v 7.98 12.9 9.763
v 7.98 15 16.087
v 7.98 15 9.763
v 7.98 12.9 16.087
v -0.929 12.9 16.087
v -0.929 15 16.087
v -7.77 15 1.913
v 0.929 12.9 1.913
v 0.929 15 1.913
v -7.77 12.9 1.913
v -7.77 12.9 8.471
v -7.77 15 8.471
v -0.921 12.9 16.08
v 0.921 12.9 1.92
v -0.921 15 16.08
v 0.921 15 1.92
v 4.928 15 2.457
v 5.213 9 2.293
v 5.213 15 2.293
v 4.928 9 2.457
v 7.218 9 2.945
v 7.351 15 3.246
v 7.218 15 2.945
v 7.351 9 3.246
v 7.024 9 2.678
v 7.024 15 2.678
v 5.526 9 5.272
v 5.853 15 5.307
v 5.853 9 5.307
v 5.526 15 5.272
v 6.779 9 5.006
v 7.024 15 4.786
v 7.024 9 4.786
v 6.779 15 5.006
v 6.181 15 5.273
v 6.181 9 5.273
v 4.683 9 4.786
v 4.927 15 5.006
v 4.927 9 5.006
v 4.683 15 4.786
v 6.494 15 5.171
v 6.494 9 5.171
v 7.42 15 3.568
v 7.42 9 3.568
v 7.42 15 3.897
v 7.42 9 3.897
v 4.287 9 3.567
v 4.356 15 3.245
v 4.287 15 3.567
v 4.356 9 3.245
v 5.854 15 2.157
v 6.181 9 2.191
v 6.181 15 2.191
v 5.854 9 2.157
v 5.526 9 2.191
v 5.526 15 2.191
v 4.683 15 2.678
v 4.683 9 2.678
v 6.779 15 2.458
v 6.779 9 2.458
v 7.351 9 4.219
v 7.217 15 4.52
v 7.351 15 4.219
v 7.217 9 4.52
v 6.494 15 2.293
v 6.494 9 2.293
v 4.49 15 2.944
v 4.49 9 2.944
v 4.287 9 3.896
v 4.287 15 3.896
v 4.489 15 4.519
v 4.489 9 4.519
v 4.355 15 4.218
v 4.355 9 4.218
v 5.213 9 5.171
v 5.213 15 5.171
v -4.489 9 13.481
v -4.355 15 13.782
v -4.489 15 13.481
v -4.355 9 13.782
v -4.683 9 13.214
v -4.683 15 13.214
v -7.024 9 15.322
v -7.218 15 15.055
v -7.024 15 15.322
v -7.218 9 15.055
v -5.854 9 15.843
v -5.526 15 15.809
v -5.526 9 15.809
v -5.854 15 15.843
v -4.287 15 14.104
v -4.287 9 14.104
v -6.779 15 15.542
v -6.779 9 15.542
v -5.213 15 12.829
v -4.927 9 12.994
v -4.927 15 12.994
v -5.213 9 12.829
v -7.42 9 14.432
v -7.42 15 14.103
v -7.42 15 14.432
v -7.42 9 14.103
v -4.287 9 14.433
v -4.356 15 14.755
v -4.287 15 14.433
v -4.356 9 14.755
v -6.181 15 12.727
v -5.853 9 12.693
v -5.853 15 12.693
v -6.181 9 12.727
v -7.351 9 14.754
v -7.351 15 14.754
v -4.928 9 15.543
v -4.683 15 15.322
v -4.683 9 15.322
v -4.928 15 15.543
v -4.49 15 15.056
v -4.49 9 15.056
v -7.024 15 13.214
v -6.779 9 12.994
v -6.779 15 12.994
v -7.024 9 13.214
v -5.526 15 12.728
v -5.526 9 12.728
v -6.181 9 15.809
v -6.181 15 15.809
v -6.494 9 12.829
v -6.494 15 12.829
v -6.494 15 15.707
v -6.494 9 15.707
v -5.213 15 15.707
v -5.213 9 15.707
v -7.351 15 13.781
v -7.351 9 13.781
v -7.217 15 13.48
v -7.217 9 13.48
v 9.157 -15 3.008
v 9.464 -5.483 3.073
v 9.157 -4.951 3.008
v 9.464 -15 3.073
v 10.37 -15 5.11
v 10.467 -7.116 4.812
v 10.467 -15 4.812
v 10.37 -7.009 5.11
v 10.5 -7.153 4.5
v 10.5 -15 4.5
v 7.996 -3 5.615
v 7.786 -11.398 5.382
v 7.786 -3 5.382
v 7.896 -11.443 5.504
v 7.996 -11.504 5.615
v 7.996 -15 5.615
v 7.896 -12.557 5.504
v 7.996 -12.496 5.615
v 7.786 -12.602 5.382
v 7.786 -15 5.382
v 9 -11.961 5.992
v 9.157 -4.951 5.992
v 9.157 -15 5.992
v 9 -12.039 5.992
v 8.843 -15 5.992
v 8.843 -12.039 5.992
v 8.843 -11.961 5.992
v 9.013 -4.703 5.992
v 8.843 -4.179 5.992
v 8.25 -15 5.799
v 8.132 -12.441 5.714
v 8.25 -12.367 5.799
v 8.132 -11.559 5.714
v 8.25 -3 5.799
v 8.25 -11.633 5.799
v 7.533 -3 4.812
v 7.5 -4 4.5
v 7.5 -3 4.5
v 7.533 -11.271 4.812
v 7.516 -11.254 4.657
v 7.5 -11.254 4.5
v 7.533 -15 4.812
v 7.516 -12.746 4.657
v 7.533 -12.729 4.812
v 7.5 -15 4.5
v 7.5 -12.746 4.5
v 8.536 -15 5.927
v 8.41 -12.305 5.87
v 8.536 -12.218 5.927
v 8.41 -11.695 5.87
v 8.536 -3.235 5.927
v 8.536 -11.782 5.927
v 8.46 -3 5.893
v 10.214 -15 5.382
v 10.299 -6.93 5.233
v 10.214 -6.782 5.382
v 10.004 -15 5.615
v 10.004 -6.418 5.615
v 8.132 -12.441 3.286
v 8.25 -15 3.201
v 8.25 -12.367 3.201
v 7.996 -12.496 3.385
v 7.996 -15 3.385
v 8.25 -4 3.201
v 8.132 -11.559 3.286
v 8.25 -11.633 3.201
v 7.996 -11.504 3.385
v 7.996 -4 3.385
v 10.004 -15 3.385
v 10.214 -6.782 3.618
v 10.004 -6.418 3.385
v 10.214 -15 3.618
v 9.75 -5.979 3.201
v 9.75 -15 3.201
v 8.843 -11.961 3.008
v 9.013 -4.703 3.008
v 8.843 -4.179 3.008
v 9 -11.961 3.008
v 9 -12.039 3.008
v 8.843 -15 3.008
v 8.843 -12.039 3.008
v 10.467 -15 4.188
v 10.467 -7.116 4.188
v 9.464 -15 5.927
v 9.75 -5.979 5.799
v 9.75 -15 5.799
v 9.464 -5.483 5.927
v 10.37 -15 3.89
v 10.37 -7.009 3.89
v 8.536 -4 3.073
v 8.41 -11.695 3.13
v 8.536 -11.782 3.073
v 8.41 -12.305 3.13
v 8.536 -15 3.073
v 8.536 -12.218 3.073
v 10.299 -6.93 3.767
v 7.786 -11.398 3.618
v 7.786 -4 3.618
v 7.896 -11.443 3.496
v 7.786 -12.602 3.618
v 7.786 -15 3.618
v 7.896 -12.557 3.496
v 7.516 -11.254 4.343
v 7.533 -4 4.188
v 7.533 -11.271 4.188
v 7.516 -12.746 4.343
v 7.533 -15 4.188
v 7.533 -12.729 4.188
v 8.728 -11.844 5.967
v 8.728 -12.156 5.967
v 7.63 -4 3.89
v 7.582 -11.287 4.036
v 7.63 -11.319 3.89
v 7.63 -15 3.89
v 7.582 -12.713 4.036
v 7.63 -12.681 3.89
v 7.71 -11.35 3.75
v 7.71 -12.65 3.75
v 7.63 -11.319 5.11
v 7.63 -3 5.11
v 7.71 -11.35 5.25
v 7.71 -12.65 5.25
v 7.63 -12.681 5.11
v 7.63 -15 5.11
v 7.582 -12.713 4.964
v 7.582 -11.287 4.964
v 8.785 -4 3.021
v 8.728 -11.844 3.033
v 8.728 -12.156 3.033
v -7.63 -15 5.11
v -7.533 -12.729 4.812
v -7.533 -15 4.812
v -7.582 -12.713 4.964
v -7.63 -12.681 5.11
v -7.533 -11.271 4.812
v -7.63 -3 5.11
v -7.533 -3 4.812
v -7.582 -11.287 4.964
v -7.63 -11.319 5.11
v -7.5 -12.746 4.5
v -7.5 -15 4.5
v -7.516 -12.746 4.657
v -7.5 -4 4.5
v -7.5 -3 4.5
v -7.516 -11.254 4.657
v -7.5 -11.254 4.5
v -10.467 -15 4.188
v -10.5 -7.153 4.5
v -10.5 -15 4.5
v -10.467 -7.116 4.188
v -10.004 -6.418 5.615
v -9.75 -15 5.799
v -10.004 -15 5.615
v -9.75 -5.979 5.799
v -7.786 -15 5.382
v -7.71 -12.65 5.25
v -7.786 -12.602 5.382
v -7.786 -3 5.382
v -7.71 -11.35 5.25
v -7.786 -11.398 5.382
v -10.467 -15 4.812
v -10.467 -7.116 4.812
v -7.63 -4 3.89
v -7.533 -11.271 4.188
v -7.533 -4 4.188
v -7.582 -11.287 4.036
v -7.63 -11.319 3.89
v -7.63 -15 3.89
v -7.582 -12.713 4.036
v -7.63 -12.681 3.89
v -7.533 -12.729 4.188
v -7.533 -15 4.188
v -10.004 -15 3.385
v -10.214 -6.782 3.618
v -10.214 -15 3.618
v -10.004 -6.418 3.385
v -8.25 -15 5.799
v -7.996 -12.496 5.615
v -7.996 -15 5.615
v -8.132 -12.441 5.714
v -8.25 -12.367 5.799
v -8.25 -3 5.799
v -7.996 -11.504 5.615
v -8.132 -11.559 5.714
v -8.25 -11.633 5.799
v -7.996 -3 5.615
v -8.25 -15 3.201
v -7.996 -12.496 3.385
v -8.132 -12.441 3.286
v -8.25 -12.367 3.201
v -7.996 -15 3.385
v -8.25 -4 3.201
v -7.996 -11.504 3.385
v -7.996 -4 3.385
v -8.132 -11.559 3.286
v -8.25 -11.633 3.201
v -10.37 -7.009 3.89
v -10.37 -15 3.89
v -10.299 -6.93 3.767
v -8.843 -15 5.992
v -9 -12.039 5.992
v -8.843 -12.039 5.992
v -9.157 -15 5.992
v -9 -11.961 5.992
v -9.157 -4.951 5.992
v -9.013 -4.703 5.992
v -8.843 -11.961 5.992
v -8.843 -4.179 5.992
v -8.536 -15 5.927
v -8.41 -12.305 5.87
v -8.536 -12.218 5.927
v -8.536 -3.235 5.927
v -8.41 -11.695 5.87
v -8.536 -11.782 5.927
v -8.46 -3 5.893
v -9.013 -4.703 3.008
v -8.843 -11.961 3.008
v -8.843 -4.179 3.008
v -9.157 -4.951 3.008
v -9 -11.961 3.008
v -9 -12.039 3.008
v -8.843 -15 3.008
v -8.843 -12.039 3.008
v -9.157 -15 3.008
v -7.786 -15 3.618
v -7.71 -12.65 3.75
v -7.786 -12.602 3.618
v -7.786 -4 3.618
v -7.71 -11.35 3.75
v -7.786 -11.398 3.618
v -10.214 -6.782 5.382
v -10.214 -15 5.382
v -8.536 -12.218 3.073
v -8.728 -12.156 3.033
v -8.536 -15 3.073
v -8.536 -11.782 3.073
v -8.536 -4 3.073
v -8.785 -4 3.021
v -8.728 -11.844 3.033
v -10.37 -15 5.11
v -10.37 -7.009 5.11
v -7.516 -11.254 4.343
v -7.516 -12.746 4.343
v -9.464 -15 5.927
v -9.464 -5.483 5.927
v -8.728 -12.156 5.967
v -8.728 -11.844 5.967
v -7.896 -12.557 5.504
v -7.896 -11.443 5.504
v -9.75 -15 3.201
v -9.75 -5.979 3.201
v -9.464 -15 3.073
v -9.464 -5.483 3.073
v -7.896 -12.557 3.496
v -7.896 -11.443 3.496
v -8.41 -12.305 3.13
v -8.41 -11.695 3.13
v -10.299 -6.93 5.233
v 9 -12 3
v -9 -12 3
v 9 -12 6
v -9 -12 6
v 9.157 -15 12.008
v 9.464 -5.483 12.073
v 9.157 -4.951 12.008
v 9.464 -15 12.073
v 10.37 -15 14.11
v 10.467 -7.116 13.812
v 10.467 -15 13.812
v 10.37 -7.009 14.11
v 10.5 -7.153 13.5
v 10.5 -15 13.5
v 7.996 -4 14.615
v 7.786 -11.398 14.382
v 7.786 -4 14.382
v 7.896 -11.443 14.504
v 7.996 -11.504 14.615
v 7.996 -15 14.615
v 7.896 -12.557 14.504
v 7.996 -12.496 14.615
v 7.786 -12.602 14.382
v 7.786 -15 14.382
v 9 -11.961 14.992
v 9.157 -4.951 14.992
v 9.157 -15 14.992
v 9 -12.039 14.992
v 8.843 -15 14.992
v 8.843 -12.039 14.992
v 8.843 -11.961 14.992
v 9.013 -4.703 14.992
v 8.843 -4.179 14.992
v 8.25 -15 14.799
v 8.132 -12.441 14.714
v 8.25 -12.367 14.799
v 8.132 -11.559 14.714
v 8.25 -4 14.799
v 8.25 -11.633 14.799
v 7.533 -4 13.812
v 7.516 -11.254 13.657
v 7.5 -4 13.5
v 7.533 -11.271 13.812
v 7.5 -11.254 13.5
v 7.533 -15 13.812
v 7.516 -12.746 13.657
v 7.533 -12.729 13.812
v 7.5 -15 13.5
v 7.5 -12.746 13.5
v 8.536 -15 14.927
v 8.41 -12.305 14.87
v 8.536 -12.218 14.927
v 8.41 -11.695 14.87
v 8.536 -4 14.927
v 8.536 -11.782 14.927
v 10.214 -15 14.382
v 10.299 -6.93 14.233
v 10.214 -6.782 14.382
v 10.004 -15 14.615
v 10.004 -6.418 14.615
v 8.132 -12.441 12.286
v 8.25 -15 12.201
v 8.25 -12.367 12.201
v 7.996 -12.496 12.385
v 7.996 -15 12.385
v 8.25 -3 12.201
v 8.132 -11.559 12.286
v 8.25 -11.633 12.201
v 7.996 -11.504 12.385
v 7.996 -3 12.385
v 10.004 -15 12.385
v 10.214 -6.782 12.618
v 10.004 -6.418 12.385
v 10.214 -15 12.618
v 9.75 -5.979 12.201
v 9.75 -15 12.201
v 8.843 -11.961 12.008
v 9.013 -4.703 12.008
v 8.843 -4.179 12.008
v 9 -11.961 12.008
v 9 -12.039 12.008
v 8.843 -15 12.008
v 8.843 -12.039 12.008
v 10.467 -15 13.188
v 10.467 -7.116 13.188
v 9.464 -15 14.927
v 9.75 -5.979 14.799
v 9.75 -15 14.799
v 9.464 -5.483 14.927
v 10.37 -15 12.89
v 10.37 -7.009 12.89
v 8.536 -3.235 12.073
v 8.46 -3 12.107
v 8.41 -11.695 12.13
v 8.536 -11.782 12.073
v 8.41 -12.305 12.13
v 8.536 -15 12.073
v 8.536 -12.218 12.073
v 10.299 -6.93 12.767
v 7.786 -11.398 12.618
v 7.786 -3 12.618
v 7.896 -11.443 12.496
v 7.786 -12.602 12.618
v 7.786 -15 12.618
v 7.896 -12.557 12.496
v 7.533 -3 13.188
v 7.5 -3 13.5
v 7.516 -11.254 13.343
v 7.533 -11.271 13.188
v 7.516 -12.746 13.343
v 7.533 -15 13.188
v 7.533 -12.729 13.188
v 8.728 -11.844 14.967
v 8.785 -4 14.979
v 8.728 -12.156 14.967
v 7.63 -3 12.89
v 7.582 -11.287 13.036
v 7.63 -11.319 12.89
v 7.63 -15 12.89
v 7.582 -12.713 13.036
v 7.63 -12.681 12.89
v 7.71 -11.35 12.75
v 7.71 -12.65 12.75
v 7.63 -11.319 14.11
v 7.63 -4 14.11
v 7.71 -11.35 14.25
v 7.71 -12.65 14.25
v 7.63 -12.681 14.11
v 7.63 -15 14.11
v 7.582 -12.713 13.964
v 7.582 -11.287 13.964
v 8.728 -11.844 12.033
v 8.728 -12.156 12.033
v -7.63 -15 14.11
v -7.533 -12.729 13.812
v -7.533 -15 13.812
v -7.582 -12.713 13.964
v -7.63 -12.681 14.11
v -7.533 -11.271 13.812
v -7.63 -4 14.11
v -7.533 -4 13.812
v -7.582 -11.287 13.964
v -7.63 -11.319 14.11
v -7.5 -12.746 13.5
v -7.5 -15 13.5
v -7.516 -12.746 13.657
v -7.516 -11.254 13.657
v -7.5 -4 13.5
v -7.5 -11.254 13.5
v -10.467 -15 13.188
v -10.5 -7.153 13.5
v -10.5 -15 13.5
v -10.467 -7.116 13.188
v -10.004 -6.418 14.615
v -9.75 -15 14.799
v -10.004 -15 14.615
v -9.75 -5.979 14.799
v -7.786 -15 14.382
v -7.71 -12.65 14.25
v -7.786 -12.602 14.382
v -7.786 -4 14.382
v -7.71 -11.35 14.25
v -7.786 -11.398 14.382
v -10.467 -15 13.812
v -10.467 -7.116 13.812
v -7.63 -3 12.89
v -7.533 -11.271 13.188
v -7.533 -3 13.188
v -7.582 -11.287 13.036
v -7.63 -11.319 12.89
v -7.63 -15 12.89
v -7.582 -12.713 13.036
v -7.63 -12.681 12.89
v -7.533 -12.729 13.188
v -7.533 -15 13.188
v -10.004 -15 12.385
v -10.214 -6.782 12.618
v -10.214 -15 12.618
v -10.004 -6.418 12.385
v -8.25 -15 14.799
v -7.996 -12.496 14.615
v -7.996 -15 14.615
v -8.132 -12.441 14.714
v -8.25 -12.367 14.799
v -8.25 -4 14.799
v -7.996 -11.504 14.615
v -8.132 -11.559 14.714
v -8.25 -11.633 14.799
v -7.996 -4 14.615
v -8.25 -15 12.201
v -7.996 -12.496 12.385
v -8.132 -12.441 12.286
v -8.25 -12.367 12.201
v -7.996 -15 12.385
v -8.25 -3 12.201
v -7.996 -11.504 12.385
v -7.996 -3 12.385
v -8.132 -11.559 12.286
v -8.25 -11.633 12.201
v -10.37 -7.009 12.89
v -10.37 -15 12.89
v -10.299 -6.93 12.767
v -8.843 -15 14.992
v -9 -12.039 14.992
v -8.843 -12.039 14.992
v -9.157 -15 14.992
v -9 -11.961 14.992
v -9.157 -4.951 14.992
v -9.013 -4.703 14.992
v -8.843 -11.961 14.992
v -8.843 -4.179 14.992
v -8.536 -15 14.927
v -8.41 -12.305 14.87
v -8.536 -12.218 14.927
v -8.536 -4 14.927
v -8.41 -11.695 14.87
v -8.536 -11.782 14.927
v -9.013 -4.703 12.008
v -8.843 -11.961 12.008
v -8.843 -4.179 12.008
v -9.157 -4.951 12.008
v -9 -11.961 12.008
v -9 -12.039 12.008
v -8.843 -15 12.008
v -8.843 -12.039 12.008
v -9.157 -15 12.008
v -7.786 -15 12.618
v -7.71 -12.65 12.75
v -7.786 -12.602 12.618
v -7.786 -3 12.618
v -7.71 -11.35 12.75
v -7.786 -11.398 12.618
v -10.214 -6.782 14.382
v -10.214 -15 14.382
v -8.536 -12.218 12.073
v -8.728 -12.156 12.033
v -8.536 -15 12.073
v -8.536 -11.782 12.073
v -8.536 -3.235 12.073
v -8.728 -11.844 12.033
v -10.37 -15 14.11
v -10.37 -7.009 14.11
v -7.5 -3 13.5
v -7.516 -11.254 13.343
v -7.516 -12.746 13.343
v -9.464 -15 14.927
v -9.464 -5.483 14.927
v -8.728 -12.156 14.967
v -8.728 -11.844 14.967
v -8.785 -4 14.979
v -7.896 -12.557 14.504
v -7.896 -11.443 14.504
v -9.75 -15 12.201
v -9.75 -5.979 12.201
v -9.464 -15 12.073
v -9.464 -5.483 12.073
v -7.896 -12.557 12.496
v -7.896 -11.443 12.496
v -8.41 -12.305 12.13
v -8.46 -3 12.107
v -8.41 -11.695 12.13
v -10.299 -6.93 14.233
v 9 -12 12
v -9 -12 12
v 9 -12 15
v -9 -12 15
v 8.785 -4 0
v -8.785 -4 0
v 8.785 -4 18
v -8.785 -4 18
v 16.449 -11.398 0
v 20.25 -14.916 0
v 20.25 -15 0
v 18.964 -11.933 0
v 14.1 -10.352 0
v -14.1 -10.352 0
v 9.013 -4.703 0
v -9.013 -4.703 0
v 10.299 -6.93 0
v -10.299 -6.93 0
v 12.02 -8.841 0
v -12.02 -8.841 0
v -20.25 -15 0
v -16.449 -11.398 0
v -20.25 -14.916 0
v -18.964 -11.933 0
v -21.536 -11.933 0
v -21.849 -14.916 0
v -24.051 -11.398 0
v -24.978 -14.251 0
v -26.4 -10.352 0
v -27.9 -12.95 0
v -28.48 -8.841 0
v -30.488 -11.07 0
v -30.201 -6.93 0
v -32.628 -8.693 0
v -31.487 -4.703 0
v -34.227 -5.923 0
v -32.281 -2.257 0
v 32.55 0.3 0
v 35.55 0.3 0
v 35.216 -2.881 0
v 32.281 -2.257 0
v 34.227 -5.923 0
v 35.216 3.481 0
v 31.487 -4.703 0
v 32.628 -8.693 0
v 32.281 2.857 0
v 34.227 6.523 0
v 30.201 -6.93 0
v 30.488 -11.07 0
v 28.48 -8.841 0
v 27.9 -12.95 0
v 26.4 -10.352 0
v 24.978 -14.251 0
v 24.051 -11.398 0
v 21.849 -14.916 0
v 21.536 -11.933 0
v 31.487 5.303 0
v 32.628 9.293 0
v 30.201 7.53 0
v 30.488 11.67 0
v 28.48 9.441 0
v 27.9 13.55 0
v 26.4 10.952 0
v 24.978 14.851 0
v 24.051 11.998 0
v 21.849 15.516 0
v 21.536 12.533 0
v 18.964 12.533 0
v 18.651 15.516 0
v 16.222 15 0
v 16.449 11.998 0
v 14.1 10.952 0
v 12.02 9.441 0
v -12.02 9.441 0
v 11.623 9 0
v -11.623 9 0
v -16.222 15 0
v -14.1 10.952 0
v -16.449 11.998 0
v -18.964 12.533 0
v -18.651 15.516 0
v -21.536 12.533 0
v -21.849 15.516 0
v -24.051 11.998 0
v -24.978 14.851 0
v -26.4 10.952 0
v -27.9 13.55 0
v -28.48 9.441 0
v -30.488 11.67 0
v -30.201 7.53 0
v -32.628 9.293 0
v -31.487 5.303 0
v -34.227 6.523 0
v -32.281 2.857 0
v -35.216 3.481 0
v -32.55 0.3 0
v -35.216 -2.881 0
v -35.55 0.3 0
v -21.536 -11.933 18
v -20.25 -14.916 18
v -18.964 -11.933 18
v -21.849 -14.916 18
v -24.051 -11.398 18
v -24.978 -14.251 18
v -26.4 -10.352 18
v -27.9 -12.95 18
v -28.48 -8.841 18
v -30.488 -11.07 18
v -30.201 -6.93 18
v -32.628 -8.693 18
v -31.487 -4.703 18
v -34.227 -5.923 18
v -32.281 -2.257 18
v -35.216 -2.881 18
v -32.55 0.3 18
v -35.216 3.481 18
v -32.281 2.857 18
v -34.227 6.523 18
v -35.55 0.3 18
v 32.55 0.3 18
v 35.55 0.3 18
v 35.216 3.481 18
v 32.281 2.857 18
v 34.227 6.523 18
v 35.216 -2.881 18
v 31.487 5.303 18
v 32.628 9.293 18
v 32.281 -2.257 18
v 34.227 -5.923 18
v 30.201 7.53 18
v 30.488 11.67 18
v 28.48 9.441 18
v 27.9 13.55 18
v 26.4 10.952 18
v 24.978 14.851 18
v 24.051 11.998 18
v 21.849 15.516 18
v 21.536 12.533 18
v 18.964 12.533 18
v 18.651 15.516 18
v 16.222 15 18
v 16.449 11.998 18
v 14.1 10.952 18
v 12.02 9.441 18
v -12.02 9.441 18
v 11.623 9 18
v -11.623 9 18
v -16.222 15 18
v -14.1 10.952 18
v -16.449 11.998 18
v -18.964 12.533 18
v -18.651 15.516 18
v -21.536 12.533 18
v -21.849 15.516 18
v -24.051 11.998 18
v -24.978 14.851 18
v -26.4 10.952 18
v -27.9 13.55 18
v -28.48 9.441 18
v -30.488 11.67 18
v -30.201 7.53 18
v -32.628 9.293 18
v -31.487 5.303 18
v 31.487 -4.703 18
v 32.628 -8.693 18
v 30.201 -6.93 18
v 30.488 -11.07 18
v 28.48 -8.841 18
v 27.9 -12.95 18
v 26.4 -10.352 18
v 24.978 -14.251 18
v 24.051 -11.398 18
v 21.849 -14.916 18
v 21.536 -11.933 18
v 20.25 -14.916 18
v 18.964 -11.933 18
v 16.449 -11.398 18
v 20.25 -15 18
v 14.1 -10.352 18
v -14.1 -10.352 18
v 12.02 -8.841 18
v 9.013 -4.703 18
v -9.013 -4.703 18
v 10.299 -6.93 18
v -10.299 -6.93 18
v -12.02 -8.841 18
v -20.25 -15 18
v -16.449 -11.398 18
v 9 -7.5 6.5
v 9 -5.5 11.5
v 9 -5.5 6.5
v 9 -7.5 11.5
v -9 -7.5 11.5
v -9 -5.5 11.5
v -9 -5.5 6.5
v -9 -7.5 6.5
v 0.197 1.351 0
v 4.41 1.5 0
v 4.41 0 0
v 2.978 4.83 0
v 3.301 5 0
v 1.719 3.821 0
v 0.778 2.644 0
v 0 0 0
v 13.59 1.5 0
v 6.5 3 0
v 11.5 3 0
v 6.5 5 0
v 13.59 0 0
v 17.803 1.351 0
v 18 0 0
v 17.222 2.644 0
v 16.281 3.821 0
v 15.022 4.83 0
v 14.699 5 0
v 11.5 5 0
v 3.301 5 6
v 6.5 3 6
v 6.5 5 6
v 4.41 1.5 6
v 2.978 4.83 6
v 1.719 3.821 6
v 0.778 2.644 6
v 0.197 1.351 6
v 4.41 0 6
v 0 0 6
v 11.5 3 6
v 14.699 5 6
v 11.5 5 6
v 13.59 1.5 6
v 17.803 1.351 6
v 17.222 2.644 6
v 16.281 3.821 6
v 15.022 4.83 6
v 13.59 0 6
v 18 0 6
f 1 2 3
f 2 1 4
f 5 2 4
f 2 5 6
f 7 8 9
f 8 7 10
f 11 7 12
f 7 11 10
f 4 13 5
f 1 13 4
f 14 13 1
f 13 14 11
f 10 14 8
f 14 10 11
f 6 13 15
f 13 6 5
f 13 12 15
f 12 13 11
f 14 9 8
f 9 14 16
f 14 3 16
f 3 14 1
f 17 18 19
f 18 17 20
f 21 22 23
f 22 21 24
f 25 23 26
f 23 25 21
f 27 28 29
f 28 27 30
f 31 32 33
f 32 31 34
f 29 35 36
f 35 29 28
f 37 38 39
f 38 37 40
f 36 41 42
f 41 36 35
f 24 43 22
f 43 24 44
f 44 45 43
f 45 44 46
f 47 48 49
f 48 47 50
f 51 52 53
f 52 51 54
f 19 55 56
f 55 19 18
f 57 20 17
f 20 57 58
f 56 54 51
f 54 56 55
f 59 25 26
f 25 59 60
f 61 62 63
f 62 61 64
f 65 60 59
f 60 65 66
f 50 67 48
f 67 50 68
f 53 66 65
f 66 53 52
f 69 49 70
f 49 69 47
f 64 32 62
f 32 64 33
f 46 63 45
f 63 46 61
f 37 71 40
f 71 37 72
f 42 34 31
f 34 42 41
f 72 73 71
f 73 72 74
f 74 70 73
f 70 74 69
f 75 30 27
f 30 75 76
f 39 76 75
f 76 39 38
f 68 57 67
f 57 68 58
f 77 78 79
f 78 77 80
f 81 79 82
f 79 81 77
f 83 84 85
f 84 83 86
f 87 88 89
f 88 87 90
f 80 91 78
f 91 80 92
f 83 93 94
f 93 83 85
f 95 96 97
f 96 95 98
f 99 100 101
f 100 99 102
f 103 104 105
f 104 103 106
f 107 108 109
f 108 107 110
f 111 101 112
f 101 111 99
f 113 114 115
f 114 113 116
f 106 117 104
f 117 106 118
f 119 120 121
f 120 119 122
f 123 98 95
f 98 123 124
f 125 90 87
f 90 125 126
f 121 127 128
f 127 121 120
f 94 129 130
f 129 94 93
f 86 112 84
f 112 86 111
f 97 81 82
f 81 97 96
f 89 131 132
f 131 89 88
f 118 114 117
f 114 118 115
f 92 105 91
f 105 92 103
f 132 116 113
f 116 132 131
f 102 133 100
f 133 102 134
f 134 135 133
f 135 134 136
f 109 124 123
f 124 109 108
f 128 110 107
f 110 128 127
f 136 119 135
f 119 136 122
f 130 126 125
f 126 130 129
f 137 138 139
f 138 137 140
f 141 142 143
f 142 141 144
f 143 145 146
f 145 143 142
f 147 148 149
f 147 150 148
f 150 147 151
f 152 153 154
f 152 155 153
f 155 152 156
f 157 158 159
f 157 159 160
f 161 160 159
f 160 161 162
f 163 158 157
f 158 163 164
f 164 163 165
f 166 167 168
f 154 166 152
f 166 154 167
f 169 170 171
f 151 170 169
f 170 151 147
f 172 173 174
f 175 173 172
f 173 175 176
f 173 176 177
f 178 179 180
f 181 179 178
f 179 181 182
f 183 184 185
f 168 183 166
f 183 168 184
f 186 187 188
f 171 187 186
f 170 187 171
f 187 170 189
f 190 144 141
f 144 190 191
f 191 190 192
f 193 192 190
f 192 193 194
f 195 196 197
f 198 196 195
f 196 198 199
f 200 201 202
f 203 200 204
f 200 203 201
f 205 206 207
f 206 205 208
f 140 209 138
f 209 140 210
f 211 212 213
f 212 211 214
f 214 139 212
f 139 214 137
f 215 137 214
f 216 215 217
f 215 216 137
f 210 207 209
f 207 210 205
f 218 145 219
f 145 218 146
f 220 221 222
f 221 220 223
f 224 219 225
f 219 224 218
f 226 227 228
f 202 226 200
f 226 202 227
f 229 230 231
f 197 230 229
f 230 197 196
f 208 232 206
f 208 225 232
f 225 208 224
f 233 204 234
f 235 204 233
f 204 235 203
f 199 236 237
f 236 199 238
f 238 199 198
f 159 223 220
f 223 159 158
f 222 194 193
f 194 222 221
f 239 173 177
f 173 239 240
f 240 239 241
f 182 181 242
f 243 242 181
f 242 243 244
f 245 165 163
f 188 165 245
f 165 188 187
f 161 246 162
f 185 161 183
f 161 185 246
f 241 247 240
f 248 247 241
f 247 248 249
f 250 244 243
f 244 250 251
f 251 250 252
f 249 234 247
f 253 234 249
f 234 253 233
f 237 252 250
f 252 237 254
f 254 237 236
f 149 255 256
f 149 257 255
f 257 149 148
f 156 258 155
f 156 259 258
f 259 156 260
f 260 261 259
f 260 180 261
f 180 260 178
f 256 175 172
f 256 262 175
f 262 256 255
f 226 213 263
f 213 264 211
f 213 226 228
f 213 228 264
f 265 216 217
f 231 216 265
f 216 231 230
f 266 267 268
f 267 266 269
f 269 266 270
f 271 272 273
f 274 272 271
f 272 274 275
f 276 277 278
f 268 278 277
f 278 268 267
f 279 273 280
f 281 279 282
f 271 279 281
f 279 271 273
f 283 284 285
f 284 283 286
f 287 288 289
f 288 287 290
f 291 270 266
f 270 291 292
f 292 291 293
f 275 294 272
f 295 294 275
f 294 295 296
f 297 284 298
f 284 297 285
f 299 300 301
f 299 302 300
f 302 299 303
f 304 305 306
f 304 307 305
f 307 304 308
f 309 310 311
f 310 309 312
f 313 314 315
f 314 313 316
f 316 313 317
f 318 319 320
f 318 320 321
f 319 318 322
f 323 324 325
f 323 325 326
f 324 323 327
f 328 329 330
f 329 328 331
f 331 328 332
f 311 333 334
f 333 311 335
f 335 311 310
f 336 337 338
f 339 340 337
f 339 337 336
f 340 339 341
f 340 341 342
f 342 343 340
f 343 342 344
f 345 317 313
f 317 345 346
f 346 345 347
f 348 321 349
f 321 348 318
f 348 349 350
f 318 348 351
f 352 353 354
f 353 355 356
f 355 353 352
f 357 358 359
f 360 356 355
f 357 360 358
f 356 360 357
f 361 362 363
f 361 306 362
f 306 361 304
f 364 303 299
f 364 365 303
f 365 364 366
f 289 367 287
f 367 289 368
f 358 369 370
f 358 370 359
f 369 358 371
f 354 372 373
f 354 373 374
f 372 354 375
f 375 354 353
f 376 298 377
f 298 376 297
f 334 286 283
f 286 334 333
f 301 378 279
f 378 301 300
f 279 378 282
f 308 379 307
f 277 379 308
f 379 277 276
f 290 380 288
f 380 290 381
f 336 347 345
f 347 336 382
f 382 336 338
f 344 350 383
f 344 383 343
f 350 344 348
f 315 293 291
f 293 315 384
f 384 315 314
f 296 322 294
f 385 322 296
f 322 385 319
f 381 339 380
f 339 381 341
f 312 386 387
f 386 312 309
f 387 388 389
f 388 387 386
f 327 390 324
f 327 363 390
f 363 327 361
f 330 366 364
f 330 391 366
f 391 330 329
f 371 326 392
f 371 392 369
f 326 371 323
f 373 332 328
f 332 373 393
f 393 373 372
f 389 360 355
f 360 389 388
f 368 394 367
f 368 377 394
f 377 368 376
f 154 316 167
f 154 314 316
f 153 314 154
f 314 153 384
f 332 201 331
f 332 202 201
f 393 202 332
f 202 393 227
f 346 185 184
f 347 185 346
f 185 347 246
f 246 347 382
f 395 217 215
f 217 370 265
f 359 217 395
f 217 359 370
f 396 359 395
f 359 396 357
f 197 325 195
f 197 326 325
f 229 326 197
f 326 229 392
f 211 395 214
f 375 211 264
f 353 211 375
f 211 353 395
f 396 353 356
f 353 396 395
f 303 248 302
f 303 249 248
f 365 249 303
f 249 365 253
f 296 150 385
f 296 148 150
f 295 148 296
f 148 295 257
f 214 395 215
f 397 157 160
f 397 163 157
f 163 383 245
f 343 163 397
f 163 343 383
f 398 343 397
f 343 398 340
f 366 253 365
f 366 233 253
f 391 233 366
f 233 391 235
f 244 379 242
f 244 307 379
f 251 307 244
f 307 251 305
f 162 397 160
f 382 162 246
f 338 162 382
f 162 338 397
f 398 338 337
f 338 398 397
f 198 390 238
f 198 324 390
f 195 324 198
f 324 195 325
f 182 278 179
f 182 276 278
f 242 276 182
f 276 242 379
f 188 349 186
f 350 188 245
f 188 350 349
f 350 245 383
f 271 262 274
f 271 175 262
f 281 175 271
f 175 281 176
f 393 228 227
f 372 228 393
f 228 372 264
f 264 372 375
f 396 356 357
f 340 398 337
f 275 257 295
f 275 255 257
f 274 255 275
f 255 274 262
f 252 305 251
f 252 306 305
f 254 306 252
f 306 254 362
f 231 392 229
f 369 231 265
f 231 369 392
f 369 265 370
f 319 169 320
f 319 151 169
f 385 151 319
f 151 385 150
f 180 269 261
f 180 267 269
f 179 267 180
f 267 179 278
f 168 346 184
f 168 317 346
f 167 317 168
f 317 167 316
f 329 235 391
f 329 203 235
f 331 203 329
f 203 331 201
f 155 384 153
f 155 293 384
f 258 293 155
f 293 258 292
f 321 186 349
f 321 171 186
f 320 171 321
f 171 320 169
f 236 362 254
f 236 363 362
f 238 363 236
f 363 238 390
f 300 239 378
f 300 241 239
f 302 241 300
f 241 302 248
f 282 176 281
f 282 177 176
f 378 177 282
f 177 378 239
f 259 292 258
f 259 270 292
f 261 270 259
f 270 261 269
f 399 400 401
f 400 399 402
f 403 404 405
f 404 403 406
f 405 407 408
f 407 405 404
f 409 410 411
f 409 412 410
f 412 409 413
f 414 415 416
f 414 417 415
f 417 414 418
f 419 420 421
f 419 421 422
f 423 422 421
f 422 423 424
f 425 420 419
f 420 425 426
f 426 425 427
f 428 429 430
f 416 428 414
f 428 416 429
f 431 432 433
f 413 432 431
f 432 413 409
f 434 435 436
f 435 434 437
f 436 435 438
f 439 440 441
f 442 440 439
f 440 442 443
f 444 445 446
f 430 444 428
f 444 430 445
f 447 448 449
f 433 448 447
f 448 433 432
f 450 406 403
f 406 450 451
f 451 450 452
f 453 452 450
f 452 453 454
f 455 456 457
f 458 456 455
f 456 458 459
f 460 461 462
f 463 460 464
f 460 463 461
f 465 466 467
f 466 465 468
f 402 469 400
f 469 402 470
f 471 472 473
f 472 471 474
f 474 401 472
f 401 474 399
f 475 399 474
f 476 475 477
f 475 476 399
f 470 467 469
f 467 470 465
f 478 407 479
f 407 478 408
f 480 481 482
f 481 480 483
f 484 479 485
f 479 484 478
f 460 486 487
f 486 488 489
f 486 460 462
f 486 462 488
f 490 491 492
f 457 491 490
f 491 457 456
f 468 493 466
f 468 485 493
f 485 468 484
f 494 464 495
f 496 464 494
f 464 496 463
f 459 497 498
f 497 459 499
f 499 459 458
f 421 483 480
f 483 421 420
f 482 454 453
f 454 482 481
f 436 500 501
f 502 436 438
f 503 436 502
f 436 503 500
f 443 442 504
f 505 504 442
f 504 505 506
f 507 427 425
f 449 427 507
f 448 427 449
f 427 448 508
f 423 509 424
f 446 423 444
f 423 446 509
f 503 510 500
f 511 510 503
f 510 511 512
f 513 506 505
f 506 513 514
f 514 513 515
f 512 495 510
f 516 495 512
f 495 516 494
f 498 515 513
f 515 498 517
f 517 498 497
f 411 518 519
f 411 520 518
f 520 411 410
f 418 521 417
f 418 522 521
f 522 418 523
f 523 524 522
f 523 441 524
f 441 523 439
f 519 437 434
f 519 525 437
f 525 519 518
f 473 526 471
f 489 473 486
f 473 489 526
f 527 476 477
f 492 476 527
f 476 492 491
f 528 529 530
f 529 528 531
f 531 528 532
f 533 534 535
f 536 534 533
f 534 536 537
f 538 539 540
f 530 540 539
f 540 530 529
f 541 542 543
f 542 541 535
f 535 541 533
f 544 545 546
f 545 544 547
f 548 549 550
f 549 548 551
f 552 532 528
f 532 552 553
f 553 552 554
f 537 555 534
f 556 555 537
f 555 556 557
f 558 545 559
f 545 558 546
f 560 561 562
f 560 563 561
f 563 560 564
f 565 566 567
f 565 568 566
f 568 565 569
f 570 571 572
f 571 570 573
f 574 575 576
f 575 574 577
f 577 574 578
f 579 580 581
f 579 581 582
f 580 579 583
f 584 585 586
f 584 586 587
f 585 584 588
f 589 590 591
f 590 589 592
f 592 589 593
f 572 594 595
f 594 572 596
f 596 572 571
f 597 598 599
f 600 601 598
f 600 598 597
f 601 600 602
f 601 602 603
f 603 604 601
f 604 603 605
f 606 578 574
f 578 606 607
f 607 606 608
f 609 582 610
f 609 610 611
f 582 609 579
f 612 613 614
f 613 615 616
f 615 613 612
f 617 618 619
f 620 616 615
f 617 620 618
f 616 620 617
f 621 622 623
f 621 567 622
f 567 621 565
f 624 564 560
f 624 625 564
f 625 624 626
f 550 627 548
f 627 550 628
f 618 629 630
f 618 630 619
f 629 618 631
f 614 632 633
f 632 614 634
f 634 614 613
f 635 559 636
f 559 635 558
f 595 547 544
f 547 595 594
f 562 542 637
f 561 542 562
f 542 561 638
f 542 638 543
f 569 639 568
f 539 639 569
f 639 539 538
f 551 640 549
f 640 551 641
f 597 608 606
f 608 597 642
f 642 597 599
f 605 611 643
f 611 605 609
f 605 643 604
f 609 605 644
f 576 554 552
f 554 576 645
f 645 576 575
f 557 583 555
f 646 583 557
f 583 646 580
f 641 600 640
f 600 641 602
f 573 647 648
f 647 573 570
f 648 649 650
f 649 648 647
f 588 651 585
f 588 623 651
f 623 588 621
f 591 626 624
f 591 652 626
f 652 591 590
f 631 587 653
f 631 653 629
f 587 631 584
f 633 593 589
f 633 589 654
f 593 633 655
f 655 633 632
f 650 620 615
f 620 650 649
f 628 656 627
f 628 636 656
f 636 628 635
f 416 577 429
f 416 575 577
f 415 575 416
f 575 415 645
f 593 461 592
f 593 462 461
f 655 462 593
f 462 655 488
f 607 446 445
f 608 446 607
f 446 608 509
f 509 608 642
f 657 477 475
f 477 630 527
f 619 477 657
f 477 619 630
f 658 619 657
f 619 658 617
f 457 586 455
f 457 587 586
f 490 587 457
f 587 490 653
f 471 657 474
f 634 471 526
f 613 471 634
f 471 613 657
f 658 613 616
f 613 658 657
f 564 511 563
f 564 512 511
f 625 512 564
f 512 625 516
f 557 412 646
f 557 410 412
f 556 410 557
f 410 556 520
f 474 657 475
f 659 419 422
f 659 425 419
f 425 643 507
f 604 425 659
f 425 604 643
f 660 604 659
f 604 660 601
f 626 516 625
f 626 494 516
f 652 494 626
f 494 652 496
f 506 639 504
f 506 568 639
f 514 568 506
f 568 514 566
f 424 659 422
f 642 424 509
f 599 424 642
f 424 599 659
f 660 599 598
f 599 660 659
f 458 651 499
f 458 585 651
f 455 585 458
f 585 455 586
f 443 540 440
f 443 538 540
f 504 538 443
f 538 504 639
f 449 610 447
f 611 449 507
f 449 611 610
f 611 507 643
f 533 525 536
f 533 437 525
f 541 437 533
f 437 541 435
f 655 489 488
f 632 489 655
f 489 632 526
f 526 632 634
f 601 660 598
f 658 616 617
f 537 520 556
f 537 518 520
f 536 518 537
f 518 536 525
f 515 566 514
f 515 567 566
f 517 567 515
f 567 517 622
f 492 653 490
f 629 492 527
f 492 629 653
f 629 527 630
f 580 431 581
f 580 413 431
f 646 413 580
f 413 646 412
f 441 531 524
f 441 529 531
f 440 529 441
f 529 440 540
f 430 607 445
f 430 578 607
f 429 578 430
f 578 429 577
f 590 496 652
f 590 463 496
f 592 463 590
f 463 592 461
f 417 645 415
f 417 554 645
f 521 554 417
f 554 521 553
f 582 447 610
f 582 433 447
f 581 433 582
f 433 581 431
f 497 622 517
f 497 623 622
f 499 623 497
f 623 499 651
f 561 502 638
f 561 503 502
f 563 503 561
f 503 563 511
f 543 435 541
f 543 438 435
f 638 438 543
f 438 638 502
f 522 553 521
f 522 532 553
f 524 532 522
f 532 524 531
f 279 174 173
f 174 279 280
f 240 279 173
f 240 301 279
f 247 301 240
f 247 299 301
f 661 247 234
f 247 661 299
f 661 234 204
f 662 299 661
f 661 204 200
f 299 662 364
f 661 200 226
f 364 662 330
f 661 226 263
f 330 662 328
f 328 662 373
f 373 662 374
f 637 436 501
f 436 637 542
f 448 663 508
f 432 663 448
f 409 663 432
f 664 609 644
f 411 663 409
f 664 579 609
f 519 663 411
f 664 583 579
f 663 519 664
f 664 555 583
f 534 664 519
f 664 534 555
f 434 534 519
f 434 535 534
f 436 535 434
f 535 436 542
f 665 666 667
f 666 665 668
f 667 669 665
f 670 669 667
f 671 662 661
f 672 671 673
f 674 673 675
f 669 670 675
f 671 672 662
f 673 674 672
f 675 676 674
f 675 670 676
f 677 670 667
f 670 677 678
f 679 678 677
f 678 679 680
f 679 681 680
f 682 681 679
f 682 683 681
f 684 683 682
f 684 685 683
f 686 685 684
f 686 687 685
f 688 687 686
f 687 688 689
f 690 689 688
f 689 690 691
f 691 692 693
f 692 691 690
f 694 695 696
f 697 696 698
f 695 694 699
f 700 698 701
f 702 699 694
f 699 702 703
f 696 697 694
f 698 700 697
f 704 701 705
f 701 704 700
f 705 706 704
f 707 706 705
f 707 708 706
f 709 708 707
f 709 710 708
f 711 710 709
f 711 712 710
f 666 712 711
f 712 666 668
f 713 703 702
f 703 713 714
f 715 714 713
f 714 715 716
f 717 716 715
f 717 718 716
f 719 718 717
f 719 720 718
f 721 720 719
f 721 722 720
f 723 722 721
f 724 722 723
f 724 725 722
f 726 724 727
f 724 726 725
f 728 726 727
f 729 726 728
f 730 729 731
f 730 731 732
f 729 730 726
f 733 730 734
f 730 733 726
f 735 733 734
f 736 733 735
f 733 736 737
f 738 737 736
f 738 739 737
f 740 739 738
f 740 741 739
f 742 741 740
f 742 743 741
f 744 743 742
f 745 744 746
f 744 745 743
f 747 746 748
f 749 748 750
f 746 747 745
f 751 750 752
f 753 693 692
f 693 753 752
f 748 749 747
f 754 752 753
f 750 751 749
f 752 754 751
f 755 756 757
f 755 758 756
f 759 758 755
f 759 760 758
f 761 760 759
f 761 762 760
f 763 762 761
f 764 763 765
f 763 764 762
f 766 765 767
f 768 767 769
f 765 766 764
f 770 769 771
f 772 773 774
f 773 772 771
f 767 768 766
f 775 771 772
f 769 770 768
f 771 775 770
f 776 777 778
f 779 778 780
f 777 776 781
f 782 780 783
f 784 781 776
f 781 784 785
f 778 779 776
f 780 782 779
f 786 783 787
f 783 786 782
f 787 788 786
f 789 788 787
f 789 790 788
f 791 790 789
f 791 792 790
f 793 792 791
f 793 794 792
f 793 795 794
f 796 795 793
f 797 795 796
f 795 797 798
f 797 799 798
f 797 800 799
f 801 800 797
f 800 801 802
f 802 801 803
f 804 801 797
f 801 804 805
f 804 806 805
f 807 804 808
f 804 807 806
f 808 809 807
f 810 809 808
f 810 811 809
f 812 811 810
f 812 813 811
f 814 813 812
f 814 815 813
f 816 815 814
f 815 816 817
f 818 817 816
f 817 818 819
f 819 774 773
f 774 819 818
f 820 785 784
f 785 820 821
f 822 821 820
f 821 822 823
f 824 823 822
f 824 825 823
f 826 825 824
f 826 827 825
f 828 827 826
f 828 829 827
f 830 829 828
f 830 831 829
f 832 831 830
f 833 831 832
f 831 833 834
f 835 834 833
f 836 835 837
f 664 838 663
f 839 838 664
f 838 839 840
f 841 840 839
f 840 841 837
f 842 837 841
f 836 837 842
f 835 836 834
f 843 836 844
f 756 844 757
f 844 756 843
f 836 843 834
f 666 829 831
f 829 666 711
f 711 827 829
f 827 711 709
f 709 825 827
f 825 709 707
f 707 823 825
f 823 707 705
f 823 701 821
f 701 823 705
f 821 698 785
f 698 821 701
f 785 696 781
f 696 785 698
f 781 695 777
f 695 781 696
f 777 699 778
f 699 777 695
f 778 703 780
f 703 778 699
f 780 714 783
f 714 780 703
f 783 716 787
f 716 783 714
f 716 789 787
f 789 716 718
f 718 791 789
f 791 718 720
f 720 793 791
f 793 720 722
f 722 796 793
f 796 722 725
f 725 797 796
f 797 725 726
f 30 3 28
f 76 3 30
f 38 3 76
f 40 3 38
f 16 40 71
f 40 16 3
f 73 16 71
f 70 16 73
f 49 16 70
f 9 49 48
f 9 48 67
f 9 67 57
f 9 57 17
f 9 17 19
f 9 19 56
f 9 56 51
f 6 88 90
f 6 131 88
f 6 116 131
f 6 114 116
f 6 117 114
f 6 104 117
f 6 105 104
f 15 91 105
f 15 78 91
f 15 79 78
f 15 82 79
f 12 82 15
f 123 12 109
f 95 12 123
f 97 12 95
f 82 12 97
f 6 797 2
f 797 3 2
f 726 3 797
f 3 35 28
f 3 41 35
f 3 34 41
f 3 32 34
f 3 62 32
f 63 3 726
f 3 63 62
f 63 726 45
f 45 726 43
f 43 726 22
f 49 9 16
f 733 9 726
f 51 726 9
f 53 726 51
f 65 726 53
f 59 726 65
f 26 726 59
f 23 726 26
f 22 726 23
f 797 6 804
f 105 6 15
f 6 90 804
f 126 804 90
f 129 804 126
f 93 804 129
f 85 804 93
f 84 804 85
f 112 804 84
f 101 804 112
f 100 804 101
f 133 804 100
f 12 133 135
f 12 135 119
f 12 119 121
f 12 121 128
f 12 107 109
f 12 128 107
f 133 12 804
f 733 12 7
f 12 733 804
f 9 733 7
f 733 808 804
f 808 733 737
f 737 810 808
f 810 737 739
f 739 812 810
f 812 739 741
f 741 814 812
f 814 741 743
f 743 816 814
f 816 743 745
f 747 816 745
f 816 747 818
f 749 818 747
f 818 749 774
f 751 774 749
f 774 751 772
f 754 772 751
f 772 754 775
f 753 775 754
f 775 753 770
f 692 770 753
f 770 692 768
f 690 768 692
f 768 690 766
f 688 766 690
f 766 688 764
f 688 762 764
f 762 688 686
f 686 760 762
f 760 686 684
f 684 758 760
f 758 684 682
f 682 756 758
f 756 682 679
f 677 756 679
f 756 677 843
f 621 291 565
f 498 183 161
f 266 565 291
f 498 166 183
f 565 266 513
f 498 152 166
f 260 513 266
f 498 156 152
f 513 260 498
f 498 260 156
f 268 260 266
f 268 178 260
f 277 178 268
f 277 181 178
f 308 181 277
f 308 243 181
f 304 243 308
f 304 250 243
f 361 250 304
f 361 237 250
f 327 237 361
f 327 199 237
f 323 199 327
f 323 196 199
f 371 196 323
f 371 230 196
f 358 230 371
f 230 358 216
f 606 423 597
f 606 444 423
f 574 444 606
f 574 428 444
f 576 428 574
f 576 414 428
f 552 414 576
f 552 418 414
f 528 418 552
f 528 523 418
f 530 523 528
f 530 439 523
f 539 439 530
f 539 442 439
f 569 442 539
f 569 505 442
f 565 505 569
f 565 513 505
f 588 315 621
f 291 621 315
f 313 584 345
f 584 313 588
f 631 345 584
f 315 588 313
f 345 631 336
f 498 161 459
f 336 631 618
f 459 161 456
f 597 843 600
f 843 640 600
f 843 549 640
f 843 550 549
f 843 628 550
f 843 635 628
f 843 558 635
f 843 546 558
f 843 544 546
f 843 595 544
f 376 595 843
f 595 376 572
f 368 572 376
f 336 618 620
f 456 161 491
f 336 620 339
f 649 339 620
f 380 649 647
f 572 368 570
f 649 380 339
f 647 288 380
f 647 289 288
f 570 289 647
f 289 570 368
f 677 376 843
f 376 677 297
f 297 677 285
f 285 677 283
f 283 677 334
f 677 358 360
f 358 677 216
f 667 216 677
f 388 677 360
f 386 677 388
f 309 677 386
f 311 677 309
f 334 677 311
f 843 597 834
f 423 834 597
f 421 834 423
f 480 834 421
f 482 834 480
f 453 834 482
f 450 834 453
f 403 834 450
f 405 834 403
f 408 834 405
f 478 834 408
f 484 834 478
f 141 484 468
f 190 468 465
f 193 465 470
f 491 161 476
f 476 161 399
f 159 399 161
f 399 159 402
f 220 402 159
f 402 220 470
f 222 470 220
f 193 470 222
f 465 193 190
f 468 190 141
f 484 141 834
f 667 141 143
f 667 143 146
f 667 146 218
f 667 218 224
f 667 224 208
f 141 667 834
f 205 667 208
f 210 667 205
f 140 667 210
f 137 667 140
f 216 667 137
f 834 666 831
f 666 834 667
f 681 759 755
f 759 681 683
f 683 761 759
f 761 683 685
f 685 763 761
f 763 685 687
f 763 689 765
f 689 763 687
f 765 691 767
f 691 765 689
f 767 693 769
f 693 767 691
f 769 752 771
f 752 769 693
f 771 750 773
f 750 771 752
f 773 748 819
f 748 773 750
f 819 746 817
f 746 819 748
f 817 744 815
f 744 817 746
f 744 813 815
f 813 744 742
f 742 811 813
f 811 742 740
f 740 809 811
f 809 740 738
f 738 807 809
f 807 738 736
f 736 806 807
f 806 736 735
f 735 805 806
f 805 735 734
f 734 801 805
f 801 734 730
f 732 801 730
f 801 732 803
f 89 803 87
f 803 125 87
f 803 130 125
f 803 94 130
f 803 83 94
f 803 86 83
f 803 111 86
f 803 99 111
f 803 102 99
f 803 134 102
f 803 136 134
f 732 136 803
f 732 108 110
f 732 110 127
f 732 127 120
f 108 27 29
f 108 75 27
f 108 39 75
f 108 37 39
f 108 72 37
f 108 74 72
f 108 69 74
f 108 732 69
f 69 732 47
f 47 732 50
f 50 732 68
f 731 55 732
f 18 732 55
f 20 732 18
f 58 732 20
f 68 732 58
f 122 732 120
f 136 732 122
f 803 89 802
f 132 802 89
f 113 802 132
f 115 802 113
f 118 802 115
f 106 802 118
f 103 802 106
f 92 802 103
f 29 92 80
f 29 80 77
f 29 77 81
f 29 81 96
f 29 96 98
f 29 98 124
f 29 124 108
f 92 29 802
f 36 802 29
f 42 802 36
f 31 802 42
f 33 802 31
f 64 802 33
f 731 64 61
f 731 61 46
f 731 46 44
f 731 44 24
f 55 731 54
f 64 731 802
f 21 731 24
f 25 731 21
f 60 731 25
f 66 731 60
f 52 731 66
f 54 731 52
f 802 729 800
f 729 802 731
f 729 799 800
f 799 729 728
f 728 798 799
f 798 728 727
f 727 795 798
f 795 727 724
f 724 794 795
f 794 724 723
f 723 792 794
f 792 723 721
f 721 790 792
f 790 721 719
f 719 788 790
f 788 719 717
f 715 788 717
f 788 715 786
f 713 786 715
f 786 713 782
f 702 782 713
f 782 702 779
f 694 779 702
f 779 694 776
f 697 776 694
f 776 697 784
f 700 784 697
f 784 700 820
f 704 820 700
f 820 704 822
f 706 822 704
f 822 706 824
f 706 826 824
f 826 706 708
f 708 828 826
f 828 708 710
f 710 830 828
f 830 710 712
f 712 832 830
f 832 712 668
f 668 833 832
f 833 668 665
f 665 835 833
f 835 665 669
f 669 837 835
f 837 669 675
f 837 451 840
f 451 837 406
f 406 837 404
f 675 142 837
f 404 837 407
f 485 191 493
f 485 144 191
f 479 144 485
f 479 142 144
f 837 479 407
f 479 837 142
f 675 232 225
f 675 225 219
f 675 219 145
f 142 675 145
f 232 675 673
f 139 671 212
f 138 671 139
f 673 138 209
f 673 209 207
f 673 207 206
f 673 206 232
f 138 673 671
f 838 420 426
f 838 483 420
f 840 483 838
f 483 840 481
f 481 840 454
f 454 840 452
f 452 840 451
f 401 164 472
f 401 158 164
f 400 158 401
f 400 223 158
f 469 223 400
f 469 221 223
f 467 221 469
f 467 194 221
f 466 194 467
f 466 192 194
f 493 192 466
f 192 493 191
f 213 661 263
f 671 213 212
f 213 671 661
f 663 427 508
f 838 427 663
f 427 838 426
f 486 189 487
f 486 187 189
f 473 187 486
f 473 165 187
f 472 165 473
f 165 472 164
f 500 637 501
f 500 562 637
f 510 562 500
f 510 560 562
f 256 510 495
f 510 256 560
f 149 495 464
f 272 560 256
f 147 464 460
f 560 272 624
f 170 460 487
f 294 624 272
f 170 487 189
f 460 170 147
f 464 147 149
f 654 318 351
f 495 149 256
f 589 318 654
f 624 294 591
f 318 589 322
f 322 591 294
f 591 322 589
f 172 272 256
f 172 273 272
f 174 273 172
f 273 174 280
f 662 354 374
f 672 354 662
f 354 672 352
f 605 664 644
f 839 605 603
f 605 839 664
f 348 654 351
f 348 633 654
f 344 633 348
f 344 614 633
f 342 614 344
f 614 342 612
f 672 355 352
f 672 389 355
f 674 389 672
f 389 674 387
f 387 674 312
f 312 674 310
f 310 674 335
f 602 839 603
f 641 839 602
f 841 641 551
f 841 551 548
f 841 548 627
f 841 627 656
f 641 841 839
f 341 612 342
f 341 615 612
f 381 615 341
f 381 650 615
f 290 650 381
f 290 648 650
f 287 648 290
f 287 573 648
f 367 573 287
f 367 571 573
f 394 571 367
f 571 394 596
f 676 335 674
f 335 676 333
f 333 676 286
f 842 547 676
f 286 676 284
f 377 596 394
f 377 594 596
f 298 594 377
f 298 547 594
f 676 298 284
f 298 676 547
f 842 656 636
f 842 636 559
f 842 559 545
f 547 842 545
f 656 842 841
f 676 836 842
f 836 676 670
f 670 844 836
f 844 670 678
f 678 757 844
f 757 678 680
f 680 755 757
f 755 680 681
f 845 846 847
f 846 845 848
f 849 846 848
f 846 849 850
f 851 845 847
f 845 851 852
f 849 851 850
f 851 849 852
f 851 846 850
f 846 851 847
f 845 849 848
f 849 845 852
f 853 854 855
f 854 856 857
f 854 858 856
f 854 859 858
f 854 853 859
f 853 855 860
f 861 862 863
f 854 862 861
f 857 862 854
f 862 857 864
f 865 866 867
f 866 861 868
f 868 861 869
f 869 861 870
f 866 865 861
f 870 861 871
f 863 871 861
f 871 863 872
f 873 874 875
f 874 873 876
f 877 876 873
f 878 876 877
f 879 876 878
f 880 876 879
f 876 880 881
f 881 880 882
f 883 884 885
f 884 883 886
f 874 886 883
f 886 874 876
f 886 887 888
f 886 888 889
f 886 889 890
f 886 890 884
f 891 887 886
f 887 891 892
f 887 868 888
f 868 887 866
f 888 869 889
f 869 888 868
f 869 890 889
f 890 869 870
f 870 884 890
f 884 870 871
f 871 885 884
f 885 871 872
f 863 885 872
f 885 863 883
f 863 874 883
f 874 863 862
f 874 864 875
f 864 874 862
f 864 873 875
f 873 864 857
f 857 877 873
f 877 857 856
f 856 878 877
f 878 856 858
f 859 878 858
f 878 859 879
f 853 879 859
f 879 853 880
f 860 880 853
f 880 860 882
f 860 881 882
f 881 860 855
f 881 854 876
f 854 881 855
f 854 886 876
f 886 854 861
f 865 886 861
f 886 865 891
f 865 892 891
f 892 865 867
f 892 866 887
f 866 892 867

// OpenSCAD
//
//  Copyright (C) 20-05-2013 Jasper den Ouden.(ojasper.nl)
//
//  This is free software: you can redistribute it and/or modify
//  it under the terms of the GNU General Public License as published
//  by the Free Software Foundation, either version 3 of the License, or
//  (at your option) any later version.
//

//Damper for the feet of a reprappro more specifically. 
//Inspired by feet out there.

$fs=0.2;

//This bit was gleaned from github.com/reprappro/Mendel,
// version 3ac59579a49410dc2204ccb1006dfabf0deeadf6
xfeet = 288;
yfeet = 320;

m8_diameter = 9;
m8_horizontal=m8_diameter+0.5;
vfvertex_height=m8_horizontal+4;

diagonal=atan2(xfeet,yfeet);
diag_y = 7;

module foot_substract()
{   w= m8_diameter;
    difference()
    {   translate ([0.1,8,0]) cube([15,20,vfvertex_height],center=true);
        translate ([-15,diag_y,6])  //Cuts off corners.
            rotate([0,diagonal,0])
            cube([20,20,20],center=true);
        translate ([15,diag_y,-6]) 
            rotate([0,diagonal,0])
            cube([20,20,20],center=true);
    }
    //Holes for tieing it to the reprap.
    rotate([0,diagonal,0])
        for( x= [1,-1]*w/1.2 ) translate([x,w]) rotate([90,0,0]) cylinder(r=3/2, h=2*w);
}

//(end gleaned bit)
w=m8_diameter;
l= 1.1*w;
t=3;
r= 1.7*w;

tw= 5;th=2; //Tie rib width and height

module damper_profile()
{
    h=2*(w+2*t);
    difference()
    {   union()
        {   square([l+2*r,h],center=true);
            for( x= [1,-1]*(l/2+r) ) translate([x,r-h/2]) circle(r);
        }
        for( x= [1,-1]*(l/2+r) ) translate([x,r-h/2]) circle(r-t);
        translate([0,t]) square([l+2*r,w+t],center=true);
    }
}

module damper()
{
    difference()
    {   linear_extrude(height=2*w) damper_profile(); //Main profile.
        translate([0,w+2*t,w]) scale(1.05) foot_substract(); //Foot hole.
        translate([0,t/2+th/2-w,w]) cube([2*w,th,tw],center=true); //Hole for tie rib.
        for( z=[w/2,3*w/2] ) translate([0,0,z])
        { //Path for elastic on ground.
            translate([-w,-w-t]) rotate([0,90]) scale([1,1/2]) cylinder(r=t/2, h=2*w);
           //And holes for elastic.
            for( x= [w,-w] ) translate([x,0]) rotate([90,0]) cylinder(r=t/2, h=2*w);
        }
        for( z=[0,2*w] ) //Grooves for tie rib clamp.
            translate([0,-t,z]) cube([2*l,th,w],center=true);
    }
}
//Tie rib
module tie_rib_clamp() //Just a block with a hole in it.
{
    linear_extrude(height=2*t) difference()
    {   intersection() //Block with some rounding.
        {   square([2*w, th+t]);
            translate([w,0]) scale([1,1.3*(th+t)/w]) circle(w);
        }
        translate([w,0]) square([1.02*w,t], center=true); //Slot for damper part.
        translate([w,th+t]) square([tw,2*th], center=true); //Slot for tie rib.
    }

}

damper();
tie_rib_clamp();
